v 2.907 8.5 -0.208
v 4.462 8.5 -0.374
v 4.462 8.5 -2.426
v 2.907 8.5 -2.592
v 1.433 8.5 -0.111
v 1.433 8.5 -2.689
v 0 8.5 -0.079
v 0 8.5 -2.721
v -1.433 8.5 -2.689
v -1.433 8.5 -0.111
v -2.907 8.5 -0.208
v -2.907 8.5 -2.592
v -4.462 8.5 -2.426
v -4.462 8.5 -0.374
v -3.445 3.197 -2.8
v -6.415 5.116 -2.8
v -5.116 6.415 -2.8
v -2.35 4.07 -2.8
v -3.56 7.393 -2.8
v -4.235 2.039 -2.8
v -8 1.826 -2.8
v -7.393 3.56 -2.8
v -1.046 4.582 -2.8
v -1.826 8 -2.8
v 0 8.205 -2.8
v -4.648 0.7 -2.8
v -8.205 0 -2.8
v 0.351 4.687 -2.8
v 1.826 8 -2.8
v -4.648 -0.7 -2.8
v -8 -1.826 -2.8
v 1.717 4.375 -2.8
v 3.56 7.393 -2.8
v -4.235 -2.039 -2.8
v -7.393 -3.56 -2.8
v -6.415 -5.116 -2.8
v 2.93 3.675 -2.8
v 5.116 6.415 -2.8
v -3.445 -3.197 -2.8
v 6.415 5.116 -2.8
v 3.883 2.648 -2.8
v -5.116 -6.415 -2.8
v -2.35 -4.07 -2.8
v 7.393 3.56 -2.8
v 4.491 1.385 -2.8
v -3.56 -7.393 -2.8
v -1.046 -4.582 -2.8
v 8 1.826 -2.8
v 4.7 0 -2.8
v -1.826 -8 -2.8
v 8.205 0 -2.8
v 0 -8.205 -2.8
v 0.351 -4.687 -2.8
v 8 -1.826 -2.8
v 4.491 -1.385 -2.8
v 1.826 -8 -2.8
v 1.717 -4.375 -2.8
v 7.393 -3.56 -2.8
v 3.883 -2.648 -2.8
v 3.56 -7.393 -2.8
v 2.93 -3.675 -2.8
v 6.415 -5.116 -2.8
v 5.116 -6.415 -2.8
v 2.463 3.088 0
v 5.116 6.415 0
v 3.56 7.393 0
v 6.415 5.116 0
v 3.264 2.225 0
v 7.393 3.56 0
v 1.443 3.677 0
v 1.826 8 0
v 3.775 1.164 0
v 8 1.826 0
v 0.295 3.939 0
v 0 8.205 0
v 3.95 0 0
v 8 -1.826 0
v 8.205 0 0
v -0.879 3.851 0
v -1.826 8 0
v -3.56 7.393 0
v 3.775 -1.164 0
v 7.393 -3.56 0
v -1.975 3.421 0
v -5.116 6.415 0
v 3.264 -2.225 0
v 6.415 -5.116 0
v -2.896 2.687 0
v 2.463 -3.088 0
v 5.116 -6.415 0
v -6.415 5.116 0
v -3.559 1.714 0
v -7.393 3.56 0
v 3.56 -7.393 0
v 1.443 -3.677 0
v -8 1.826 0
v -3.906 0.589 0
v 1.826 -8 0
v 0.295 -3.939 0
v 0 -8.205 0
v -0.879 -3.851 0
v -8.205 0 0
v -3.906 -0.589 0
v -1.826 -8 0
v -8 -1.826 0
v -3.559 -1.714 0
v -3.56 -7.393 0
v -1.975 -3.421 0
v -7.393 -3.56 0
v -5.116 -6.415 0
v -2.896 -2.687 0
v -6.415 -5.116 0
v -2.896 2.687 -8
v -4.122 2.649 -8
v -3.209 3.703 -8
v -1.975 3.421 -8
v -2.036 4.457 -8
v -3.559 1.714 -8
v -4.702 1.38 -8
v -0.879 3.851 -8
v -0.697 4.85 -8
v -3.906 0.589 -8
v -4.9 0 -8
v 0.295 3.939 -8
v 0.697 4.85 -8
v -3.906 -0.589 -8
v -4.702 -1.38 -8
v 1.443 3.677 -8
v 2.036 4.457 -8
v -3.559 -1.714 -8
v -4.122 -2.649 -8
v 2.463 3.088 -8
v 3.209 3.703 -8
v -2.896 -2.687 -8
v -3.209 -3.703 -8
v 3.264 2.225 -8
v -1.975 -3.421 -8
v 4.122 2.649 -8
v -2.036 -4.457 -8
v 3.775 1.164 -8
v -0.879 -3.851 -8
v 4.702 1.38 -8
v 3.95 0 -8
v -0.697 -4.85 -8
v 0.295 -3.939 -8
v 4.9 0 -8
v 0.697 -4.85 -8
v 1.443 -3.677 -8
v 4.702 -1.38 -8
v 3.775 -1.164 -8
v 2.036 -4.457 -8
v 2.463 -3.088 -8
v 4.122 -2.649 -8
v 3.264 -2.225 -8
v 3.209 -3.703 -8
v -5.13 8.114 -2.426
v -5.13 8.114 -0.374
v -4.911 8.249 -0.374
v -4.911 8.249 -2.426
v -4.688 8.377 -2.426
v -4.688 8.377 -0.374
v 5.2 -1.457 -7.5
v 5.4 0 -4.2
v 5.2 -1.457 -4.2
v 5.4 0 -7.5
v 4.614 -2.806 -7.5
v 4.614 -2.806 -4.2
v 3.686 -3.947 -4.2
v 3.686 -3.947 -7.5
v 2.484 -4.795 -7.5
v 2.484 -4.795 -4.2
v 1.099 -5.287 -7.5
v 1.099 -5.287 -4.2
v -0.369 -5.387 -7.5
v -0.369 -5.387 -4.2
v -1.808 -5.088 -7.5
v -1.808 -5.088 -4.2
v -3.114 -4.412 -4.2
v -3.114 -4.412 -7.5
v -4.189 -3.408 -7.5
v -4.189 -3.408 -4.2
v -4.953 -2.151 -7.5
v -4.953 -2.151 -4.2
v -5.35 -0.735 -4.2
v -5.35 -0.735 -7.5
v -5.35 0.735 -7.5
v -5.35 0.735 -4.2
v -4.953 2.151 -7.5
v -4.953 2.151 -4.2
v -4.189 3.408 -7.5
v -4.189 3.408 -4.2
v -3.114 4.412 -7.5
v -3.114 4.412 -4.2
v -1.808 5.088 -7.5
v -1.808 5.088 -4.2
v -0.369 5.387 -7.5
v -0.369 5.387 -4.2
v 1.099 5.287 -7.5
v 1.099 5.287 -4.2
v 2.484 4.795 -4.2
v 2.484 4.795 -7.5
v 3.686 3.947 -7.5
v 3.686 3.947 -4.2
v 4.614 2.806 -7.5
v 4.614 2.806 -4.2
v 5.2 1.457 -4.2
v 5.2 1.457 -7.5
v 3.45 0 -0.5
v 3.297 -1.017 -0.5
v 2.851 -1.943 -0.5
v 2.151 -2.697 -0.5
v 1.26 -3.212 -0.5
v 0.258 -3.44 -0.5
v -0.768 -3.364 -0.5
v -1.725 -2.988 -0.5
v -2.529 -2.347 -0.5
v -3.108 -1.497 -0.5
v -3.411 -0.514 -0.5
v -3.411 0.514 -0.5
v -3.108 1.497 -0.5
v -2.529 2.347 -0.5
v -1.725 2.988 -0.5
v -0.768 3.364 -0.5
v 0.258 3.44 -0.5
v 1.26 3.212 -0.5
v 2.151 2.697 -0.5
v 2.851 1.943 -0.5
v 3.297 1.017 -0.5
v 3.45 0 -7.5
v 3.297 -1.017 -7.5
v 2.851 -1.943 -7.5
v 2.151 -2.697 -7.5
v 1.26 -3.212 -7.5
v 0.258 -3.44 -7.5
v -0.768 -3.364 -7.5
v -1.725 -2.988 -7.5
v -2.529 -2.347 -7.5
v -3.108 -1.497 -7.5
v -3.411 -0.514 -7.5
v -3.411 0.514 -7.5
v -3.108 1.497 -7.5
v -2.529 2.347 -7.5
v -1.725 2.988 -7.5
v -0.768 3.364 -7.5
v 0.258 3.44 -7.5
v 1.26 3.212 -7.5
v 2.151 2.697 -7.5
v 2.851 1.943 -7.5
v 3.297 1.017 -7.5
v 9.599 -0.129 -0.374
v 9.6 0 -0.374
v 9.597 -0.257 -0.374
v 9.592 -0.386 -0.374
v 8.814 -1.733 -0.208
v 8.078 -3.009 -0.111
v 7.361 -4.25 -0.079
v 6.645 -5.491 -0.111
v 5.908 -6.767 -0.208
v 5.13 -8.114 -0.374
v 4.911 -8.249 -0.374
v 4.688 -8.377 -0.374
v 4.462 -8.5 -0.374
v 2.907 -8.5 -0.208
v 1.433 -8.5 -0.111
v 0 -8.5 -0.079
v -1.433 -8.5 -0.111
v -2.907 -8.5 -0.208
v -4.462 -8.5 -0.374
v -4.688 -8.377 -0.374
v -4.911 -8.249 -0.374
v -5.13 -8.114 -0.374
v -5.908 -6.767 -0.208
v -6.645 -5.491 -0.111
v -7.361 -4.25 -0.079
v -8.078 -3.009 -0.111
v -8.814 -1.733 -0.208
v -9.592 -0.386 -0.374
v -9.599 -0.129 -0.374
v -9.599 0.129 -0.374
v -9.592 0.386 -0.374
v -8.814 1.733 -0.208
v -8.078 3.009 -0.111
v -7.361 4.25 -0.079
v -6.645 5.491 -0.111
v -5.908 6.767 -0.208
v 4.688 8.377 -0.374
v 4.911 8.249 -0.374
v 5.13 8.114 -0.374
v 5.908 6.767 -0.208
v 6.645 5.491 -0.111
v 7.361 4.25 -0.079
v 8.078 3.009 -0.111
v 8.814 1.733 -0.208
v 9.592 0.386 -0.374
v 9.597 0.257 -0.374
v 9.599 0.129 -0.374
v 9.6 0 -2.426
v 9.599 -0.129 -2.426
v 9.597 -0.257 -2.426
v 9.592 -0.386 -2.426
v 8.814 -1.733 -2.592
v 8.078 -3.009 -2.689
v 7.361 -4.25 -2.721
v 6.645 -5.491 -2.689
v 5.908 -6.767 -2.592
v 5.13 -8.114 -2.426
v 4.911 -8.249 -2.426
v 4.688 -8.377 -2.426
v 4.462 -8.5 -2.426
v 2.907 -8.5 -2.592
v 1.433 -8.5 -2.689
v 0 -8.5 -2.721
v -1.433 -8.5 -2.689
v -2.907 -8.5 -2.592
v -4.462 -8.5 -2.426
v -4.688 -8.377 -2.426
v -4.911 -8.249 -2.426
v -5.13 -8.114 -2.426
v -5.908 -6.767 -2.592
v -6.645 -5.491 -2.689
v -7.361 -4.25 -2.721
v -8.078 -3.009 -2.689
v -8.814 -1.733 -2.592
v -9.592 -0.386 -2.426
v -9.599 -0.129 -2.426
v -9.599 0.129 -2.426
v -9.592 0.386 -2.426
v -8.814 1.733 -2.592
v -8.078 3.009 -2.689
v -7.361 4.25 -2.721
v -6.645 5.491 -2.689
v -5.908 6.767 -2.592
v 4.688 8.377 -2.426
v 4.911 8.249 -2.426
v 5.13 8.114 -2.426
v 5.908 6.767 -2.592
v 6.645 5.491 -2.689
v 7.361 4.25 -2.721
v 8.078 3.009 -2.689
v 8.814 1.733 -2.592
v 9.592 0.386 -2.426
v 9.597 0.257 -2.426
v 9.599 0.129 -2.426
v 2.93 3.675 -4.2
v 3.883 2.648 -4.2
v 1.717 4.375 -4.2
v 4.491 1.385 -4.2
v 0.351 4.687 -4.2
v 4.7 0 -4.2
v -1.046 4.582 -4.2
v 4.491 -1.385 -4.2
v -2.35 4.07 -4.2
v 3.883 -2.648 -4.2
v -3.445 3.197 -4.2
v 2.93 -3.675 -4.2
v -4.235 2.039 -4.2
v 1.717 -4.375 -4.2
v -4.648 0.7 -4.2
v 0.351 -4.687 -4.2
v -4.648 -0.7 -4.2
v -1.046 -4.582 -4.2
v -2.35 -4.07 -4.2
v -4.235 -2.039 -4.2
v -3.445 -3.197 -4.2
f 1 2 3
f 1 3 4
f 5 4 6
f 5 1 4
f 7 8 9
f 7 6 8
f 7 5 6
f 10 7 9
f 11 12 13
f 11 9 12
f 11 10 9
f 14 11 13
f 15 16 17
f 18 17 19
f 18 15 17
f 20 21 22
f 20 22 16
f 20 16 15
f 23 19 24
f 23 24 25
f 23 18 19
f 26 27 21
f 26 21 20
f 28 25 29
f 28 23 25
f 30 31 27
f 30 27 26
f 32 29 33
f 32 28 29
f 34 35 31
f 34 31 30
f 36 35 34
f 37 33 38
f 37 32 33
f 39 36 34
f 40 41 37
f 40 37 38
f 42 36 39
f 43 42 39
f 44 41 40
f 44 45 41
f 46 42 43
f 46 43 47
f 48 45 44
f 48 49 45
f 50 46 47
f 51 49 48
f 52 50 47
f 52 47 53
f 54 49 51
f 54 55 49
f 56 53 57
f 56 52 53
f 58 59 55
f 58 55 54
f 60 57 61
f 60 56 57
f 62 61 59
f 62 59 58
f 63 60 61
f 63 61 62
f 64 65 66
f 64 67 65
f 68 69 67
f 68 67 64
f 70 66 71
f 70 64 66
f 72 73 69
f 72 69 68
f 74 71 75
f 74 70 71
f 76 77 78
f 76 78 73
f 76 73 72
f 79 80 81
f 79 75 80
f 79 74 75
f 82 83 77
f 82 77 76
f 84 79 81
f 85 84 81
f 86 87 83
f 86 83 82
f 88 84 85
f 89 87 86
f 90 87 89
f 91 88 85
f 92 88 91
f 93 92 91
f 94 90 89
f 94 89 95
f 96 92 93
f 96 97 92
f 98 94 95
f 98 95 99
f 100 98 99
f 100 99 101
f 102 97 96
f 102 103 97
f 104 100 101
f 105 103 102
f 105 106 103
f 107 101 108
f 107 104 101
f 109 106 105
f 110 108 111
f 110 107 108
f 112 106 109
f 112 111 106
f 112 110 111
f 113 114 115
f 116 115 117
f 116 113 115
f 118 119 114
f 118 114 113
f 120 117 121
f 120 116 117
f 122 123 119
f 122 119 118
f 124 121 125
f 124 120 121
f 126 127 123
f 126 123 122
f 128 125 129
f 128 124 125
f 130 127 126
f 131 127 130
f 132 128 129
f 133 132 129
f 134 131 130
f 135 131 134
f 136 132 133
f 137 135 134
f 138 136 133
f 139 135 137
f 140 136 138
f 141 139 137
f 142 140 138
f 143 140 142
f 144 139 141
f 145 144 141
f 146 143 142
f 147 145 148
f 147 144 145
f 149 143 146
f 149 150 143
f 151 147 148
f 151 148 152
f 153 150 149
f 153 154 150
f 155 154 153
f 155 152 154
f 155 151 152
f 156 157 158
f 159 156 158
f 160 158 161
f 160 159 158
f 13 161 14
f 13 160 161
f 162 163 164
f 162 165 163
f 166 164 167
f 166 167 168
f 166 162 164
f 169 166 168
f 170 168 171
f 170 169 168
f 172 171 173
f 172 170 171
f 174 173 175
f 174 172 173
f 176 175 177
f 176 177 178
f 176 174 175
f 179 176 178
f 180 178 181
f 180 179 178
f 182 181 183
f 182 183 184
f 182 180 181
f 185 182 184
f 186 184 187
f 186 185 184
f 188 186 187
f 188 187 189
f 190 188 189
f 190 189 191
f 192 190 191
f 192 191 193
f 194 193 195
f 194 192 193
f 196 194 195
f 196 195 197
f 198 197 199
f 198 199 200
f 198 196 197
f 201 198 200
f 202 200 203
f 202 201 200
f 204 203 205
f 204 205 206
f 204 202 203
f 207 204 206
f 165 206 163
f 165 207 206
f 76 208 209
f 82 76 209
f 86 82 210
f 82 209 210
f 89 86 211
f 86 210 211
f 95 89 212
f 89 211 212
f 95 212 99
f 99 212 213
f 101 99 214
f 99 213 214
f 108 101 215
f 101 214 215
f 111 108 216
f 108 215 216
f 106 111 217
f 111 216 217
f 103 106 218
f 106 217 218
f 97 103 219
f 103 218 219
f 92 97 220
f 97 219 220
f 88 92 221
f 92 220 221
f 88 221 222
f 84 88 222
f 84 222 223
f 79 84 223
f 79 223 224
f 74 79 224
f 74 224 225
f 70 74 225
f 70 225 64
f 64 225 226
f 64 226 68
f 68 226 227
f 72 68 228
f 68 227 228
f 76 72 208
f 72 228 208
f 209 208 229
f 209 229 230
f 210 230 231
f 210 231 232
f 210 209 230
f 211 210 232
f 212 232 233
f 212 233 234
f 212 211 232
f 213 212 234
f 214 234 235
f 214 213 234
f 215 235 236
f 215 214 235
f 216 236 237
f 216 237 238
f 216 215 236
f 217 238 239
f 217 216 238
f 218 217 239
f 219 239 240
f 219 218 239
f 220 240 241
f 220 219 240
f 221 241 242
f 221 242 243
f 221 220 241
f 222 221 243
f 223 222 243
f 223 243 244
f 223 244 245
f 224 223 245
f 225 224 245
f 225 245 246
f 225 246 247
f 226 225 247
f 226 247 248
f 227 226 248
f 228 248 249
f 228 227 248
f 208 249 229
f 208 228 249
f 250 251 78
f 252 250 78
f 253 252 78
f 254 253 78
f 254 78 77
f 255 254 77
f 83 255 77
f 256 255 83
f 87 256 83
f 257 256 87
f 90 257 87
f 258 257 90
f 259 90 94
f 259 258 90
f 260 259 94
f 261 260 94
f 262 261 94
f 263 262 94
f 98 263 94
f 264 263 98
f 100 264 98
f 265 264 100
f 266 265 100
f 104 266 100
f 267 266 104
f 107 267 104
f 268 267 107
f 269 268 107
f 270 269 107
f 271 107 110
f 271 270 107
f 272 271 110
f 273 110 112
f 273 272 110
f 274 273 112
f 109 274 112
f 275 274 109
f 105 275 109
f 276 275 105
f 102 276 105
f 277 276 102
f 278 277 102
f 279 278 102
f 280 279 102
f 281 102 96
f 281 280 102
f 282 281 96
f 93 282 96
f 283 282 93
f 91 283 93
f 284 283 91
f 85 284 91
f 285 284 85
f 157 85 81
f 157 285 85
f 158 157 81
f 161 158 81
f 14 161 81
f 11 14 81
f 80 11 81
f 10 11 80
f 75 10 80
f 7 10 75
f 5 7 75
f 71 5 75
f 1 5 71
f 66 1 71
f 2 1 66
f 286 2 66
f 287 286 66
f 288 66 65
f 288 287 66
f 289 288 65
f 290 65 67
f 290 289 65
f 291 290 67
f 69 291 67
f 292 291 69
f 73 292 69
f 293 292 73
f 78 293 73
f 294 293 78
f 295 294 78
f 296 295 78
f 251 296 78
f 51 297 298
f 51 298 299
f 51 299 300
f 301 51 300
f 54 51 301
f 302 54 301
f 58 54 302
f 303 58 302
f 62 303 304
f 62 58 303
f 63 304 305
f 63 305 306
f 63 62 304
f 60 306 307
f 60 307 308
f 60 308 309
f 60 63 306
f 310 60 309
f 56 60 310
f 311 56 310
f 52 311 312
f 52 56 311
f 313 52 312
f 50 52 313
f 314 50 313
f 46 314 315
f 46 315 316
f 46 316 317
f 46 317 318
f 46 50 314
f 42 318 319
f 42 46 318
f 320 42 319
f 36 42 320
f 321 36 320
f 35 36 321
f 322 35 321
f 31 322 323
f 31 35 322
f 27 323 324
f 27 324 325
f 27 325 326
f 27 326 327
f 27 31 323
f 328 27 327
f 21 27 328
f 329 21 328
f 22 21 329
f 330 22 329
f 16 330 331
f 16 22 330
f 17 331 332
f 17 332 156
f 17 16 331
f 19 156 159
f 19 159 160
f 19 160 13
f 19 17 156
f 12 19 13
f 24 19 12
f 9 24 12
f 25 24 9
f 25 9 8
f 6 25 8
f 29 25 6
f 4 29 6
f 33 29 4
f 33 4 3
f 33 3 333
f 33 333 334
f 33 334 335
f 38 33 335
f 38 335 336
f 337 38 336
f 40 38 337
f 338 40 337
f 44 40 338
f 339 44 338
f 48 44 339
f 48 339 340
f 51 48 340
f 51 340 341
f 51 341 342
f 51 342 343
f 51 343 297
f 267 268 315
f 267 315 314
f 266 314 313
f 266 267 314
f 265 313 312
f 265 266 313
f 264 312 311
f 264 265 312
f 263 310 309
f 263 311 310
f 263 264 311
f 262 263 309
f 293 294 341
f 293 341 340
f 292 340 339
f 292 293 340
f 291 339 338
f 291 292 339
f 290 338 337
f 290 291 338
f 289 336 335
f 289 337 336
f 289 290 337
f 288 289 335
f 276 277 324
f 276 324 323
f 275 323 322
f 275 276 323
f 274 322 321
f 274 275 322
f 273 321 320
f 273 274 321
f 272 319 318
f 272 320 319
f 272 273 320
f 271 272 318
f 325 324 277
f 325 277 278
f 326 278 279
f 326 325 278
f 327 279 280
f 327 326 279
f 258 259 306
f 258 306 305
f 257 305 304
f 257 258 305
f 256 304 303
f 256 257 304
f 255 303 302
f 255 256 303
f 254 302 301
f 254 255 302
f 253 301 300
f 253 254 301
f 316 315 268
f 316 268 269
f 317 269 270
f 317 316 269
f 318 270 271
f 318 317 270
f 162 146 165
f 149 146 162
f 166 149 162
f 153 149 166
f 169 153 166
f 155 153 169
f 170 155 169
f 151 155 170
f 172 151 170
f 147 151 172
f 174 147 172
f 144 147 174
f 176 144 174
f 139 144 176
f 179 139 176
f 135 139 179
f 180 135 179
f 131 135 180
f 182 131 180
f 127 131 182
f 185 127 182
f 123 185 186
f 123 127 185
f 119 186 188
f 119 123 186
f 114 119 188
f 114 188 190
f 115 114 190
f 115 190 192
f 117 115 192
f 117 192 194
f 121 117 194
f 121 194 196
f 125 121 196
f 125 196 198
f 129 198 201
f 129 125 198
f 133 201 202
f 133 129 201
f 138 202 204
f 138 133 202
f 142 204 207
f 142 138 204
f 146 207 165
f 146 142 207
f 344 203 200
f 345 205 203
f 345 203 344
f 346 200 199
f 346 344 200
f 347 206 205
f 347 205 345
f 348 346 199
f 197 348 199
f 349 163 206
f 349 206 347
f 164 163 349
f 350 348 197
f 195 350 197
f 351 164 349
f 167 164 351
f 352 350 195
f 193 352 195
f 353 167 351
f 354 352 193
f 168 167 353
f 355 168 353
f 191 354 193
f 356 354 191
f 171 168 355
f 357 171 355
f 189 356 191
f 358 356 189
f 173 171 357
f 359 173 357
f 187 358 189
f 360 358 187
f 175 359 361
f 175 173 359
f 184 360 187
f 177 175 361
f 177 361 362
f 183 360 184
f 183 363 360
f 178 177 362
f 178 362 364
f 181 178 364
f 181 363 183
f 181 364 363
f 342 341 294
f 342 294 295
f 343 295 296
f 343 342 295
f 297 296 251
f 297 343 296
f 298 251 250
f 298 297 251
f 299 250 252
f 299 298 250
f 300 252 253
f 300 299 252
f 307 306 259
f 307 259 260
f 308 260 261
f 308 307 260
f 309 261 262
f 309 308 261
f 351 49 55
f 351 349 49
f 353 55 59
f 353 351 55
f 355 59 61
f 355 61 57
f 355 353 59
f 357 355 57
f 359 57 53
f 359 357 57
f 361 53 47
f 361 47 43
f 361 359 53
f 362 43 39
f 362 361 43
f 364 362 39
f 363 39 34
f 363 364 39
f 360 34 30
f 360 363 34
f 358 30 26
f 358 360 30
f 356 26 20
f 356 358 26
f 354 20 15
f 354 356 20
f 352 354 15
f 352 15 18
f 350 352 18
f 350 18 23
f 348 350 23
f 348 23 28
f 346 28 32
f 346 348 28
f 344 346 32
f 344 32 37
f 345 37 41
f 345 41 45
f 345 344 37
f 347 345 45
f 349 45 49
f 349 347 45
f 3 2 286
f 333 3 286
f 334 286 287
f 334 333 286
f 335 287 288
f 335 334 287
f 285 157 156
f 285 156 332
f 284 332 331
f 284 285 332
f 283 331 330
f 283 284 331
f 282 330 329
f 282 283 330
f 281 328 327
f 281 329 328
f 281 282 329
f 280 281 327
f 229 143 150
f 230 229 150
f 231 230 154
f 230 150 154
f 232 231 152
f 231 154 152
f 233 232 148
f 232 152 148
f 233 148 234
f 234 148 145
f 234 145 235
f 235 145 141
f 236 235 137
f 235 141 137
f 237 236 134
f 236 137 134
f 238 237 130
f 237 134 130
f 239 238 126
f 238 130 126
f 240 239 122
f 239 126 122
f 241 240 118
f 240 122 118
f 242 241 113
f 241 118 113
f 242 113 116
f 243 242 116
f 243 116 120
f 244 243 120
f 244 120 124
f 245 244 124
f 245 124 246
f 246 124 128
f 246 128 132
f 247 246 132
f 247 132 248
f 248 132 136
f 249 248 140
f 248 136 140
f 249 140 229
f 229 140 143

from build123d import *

# Parameters (mm, degrees)
SKETCH2_OUTSIDE_W  = 26.862
SKETCH2_OUTSIDE_H  = 26.862
CUT_EXTRUDE1_DEPTH = 10
CHAMFER1_SIZE      = 0.5


with BuildPart() as part:
    # Sketch1 → Revolve1 (revolve)
    with BuildSketch(Plane(origin=(0, 0, 0), x_dir=(0, 0, -1), z_dir=(1, 0, 0)), mode=Mode.PRIVATE) as revolve1_sk:
        Polygon((0, 3.45), (0, 8.205420274), (0.373676511, 9.6), (2.426323489, 9.6), (2.8, 8.205420274), (2.8, 4.7), (4.2, 4.7), (4.2, 5.4), (7.5, 5.4), (8, 4.9), (8, 3.45), align=None)
    revolve(revolve1_sk.sketch.rotate(Axis((0, 0, 0), (0, 0, -1)), 90), axis=Axis((0, 0, 0), (0, 0, -1)))

    # Sketch2 outside → Cut-Extrude1 (cut)
    with BuildSketch(Plane.XY):
        Rectangle(SKETCH2_OUTSIDE_W, SKETCH2_OUTSIDE_H)
        Polygon((9.814954576, 0), (4.907477288, 8.5), (-4.907477288, 8.5), (-9.814954576, 0), (-4.907477288, -8.5), (4.907477288, -8.5), align=None, mode=Mode.SUBTRACT)
    extrude(amount=-CUT_EXTRUDE1_DEPTH, mode=Mode.SUBTRACT)

    # Chamfer1
    chamfer1_edges = [part.edges().sort_by_distance(p)[0] for p in [
        (-3.45, 0, 0),
        (-3.45, 0, -8),
    ]]
    chamfer(chamfer1_edges, length=CHAMFER1_SIZE)


solid = part.part
